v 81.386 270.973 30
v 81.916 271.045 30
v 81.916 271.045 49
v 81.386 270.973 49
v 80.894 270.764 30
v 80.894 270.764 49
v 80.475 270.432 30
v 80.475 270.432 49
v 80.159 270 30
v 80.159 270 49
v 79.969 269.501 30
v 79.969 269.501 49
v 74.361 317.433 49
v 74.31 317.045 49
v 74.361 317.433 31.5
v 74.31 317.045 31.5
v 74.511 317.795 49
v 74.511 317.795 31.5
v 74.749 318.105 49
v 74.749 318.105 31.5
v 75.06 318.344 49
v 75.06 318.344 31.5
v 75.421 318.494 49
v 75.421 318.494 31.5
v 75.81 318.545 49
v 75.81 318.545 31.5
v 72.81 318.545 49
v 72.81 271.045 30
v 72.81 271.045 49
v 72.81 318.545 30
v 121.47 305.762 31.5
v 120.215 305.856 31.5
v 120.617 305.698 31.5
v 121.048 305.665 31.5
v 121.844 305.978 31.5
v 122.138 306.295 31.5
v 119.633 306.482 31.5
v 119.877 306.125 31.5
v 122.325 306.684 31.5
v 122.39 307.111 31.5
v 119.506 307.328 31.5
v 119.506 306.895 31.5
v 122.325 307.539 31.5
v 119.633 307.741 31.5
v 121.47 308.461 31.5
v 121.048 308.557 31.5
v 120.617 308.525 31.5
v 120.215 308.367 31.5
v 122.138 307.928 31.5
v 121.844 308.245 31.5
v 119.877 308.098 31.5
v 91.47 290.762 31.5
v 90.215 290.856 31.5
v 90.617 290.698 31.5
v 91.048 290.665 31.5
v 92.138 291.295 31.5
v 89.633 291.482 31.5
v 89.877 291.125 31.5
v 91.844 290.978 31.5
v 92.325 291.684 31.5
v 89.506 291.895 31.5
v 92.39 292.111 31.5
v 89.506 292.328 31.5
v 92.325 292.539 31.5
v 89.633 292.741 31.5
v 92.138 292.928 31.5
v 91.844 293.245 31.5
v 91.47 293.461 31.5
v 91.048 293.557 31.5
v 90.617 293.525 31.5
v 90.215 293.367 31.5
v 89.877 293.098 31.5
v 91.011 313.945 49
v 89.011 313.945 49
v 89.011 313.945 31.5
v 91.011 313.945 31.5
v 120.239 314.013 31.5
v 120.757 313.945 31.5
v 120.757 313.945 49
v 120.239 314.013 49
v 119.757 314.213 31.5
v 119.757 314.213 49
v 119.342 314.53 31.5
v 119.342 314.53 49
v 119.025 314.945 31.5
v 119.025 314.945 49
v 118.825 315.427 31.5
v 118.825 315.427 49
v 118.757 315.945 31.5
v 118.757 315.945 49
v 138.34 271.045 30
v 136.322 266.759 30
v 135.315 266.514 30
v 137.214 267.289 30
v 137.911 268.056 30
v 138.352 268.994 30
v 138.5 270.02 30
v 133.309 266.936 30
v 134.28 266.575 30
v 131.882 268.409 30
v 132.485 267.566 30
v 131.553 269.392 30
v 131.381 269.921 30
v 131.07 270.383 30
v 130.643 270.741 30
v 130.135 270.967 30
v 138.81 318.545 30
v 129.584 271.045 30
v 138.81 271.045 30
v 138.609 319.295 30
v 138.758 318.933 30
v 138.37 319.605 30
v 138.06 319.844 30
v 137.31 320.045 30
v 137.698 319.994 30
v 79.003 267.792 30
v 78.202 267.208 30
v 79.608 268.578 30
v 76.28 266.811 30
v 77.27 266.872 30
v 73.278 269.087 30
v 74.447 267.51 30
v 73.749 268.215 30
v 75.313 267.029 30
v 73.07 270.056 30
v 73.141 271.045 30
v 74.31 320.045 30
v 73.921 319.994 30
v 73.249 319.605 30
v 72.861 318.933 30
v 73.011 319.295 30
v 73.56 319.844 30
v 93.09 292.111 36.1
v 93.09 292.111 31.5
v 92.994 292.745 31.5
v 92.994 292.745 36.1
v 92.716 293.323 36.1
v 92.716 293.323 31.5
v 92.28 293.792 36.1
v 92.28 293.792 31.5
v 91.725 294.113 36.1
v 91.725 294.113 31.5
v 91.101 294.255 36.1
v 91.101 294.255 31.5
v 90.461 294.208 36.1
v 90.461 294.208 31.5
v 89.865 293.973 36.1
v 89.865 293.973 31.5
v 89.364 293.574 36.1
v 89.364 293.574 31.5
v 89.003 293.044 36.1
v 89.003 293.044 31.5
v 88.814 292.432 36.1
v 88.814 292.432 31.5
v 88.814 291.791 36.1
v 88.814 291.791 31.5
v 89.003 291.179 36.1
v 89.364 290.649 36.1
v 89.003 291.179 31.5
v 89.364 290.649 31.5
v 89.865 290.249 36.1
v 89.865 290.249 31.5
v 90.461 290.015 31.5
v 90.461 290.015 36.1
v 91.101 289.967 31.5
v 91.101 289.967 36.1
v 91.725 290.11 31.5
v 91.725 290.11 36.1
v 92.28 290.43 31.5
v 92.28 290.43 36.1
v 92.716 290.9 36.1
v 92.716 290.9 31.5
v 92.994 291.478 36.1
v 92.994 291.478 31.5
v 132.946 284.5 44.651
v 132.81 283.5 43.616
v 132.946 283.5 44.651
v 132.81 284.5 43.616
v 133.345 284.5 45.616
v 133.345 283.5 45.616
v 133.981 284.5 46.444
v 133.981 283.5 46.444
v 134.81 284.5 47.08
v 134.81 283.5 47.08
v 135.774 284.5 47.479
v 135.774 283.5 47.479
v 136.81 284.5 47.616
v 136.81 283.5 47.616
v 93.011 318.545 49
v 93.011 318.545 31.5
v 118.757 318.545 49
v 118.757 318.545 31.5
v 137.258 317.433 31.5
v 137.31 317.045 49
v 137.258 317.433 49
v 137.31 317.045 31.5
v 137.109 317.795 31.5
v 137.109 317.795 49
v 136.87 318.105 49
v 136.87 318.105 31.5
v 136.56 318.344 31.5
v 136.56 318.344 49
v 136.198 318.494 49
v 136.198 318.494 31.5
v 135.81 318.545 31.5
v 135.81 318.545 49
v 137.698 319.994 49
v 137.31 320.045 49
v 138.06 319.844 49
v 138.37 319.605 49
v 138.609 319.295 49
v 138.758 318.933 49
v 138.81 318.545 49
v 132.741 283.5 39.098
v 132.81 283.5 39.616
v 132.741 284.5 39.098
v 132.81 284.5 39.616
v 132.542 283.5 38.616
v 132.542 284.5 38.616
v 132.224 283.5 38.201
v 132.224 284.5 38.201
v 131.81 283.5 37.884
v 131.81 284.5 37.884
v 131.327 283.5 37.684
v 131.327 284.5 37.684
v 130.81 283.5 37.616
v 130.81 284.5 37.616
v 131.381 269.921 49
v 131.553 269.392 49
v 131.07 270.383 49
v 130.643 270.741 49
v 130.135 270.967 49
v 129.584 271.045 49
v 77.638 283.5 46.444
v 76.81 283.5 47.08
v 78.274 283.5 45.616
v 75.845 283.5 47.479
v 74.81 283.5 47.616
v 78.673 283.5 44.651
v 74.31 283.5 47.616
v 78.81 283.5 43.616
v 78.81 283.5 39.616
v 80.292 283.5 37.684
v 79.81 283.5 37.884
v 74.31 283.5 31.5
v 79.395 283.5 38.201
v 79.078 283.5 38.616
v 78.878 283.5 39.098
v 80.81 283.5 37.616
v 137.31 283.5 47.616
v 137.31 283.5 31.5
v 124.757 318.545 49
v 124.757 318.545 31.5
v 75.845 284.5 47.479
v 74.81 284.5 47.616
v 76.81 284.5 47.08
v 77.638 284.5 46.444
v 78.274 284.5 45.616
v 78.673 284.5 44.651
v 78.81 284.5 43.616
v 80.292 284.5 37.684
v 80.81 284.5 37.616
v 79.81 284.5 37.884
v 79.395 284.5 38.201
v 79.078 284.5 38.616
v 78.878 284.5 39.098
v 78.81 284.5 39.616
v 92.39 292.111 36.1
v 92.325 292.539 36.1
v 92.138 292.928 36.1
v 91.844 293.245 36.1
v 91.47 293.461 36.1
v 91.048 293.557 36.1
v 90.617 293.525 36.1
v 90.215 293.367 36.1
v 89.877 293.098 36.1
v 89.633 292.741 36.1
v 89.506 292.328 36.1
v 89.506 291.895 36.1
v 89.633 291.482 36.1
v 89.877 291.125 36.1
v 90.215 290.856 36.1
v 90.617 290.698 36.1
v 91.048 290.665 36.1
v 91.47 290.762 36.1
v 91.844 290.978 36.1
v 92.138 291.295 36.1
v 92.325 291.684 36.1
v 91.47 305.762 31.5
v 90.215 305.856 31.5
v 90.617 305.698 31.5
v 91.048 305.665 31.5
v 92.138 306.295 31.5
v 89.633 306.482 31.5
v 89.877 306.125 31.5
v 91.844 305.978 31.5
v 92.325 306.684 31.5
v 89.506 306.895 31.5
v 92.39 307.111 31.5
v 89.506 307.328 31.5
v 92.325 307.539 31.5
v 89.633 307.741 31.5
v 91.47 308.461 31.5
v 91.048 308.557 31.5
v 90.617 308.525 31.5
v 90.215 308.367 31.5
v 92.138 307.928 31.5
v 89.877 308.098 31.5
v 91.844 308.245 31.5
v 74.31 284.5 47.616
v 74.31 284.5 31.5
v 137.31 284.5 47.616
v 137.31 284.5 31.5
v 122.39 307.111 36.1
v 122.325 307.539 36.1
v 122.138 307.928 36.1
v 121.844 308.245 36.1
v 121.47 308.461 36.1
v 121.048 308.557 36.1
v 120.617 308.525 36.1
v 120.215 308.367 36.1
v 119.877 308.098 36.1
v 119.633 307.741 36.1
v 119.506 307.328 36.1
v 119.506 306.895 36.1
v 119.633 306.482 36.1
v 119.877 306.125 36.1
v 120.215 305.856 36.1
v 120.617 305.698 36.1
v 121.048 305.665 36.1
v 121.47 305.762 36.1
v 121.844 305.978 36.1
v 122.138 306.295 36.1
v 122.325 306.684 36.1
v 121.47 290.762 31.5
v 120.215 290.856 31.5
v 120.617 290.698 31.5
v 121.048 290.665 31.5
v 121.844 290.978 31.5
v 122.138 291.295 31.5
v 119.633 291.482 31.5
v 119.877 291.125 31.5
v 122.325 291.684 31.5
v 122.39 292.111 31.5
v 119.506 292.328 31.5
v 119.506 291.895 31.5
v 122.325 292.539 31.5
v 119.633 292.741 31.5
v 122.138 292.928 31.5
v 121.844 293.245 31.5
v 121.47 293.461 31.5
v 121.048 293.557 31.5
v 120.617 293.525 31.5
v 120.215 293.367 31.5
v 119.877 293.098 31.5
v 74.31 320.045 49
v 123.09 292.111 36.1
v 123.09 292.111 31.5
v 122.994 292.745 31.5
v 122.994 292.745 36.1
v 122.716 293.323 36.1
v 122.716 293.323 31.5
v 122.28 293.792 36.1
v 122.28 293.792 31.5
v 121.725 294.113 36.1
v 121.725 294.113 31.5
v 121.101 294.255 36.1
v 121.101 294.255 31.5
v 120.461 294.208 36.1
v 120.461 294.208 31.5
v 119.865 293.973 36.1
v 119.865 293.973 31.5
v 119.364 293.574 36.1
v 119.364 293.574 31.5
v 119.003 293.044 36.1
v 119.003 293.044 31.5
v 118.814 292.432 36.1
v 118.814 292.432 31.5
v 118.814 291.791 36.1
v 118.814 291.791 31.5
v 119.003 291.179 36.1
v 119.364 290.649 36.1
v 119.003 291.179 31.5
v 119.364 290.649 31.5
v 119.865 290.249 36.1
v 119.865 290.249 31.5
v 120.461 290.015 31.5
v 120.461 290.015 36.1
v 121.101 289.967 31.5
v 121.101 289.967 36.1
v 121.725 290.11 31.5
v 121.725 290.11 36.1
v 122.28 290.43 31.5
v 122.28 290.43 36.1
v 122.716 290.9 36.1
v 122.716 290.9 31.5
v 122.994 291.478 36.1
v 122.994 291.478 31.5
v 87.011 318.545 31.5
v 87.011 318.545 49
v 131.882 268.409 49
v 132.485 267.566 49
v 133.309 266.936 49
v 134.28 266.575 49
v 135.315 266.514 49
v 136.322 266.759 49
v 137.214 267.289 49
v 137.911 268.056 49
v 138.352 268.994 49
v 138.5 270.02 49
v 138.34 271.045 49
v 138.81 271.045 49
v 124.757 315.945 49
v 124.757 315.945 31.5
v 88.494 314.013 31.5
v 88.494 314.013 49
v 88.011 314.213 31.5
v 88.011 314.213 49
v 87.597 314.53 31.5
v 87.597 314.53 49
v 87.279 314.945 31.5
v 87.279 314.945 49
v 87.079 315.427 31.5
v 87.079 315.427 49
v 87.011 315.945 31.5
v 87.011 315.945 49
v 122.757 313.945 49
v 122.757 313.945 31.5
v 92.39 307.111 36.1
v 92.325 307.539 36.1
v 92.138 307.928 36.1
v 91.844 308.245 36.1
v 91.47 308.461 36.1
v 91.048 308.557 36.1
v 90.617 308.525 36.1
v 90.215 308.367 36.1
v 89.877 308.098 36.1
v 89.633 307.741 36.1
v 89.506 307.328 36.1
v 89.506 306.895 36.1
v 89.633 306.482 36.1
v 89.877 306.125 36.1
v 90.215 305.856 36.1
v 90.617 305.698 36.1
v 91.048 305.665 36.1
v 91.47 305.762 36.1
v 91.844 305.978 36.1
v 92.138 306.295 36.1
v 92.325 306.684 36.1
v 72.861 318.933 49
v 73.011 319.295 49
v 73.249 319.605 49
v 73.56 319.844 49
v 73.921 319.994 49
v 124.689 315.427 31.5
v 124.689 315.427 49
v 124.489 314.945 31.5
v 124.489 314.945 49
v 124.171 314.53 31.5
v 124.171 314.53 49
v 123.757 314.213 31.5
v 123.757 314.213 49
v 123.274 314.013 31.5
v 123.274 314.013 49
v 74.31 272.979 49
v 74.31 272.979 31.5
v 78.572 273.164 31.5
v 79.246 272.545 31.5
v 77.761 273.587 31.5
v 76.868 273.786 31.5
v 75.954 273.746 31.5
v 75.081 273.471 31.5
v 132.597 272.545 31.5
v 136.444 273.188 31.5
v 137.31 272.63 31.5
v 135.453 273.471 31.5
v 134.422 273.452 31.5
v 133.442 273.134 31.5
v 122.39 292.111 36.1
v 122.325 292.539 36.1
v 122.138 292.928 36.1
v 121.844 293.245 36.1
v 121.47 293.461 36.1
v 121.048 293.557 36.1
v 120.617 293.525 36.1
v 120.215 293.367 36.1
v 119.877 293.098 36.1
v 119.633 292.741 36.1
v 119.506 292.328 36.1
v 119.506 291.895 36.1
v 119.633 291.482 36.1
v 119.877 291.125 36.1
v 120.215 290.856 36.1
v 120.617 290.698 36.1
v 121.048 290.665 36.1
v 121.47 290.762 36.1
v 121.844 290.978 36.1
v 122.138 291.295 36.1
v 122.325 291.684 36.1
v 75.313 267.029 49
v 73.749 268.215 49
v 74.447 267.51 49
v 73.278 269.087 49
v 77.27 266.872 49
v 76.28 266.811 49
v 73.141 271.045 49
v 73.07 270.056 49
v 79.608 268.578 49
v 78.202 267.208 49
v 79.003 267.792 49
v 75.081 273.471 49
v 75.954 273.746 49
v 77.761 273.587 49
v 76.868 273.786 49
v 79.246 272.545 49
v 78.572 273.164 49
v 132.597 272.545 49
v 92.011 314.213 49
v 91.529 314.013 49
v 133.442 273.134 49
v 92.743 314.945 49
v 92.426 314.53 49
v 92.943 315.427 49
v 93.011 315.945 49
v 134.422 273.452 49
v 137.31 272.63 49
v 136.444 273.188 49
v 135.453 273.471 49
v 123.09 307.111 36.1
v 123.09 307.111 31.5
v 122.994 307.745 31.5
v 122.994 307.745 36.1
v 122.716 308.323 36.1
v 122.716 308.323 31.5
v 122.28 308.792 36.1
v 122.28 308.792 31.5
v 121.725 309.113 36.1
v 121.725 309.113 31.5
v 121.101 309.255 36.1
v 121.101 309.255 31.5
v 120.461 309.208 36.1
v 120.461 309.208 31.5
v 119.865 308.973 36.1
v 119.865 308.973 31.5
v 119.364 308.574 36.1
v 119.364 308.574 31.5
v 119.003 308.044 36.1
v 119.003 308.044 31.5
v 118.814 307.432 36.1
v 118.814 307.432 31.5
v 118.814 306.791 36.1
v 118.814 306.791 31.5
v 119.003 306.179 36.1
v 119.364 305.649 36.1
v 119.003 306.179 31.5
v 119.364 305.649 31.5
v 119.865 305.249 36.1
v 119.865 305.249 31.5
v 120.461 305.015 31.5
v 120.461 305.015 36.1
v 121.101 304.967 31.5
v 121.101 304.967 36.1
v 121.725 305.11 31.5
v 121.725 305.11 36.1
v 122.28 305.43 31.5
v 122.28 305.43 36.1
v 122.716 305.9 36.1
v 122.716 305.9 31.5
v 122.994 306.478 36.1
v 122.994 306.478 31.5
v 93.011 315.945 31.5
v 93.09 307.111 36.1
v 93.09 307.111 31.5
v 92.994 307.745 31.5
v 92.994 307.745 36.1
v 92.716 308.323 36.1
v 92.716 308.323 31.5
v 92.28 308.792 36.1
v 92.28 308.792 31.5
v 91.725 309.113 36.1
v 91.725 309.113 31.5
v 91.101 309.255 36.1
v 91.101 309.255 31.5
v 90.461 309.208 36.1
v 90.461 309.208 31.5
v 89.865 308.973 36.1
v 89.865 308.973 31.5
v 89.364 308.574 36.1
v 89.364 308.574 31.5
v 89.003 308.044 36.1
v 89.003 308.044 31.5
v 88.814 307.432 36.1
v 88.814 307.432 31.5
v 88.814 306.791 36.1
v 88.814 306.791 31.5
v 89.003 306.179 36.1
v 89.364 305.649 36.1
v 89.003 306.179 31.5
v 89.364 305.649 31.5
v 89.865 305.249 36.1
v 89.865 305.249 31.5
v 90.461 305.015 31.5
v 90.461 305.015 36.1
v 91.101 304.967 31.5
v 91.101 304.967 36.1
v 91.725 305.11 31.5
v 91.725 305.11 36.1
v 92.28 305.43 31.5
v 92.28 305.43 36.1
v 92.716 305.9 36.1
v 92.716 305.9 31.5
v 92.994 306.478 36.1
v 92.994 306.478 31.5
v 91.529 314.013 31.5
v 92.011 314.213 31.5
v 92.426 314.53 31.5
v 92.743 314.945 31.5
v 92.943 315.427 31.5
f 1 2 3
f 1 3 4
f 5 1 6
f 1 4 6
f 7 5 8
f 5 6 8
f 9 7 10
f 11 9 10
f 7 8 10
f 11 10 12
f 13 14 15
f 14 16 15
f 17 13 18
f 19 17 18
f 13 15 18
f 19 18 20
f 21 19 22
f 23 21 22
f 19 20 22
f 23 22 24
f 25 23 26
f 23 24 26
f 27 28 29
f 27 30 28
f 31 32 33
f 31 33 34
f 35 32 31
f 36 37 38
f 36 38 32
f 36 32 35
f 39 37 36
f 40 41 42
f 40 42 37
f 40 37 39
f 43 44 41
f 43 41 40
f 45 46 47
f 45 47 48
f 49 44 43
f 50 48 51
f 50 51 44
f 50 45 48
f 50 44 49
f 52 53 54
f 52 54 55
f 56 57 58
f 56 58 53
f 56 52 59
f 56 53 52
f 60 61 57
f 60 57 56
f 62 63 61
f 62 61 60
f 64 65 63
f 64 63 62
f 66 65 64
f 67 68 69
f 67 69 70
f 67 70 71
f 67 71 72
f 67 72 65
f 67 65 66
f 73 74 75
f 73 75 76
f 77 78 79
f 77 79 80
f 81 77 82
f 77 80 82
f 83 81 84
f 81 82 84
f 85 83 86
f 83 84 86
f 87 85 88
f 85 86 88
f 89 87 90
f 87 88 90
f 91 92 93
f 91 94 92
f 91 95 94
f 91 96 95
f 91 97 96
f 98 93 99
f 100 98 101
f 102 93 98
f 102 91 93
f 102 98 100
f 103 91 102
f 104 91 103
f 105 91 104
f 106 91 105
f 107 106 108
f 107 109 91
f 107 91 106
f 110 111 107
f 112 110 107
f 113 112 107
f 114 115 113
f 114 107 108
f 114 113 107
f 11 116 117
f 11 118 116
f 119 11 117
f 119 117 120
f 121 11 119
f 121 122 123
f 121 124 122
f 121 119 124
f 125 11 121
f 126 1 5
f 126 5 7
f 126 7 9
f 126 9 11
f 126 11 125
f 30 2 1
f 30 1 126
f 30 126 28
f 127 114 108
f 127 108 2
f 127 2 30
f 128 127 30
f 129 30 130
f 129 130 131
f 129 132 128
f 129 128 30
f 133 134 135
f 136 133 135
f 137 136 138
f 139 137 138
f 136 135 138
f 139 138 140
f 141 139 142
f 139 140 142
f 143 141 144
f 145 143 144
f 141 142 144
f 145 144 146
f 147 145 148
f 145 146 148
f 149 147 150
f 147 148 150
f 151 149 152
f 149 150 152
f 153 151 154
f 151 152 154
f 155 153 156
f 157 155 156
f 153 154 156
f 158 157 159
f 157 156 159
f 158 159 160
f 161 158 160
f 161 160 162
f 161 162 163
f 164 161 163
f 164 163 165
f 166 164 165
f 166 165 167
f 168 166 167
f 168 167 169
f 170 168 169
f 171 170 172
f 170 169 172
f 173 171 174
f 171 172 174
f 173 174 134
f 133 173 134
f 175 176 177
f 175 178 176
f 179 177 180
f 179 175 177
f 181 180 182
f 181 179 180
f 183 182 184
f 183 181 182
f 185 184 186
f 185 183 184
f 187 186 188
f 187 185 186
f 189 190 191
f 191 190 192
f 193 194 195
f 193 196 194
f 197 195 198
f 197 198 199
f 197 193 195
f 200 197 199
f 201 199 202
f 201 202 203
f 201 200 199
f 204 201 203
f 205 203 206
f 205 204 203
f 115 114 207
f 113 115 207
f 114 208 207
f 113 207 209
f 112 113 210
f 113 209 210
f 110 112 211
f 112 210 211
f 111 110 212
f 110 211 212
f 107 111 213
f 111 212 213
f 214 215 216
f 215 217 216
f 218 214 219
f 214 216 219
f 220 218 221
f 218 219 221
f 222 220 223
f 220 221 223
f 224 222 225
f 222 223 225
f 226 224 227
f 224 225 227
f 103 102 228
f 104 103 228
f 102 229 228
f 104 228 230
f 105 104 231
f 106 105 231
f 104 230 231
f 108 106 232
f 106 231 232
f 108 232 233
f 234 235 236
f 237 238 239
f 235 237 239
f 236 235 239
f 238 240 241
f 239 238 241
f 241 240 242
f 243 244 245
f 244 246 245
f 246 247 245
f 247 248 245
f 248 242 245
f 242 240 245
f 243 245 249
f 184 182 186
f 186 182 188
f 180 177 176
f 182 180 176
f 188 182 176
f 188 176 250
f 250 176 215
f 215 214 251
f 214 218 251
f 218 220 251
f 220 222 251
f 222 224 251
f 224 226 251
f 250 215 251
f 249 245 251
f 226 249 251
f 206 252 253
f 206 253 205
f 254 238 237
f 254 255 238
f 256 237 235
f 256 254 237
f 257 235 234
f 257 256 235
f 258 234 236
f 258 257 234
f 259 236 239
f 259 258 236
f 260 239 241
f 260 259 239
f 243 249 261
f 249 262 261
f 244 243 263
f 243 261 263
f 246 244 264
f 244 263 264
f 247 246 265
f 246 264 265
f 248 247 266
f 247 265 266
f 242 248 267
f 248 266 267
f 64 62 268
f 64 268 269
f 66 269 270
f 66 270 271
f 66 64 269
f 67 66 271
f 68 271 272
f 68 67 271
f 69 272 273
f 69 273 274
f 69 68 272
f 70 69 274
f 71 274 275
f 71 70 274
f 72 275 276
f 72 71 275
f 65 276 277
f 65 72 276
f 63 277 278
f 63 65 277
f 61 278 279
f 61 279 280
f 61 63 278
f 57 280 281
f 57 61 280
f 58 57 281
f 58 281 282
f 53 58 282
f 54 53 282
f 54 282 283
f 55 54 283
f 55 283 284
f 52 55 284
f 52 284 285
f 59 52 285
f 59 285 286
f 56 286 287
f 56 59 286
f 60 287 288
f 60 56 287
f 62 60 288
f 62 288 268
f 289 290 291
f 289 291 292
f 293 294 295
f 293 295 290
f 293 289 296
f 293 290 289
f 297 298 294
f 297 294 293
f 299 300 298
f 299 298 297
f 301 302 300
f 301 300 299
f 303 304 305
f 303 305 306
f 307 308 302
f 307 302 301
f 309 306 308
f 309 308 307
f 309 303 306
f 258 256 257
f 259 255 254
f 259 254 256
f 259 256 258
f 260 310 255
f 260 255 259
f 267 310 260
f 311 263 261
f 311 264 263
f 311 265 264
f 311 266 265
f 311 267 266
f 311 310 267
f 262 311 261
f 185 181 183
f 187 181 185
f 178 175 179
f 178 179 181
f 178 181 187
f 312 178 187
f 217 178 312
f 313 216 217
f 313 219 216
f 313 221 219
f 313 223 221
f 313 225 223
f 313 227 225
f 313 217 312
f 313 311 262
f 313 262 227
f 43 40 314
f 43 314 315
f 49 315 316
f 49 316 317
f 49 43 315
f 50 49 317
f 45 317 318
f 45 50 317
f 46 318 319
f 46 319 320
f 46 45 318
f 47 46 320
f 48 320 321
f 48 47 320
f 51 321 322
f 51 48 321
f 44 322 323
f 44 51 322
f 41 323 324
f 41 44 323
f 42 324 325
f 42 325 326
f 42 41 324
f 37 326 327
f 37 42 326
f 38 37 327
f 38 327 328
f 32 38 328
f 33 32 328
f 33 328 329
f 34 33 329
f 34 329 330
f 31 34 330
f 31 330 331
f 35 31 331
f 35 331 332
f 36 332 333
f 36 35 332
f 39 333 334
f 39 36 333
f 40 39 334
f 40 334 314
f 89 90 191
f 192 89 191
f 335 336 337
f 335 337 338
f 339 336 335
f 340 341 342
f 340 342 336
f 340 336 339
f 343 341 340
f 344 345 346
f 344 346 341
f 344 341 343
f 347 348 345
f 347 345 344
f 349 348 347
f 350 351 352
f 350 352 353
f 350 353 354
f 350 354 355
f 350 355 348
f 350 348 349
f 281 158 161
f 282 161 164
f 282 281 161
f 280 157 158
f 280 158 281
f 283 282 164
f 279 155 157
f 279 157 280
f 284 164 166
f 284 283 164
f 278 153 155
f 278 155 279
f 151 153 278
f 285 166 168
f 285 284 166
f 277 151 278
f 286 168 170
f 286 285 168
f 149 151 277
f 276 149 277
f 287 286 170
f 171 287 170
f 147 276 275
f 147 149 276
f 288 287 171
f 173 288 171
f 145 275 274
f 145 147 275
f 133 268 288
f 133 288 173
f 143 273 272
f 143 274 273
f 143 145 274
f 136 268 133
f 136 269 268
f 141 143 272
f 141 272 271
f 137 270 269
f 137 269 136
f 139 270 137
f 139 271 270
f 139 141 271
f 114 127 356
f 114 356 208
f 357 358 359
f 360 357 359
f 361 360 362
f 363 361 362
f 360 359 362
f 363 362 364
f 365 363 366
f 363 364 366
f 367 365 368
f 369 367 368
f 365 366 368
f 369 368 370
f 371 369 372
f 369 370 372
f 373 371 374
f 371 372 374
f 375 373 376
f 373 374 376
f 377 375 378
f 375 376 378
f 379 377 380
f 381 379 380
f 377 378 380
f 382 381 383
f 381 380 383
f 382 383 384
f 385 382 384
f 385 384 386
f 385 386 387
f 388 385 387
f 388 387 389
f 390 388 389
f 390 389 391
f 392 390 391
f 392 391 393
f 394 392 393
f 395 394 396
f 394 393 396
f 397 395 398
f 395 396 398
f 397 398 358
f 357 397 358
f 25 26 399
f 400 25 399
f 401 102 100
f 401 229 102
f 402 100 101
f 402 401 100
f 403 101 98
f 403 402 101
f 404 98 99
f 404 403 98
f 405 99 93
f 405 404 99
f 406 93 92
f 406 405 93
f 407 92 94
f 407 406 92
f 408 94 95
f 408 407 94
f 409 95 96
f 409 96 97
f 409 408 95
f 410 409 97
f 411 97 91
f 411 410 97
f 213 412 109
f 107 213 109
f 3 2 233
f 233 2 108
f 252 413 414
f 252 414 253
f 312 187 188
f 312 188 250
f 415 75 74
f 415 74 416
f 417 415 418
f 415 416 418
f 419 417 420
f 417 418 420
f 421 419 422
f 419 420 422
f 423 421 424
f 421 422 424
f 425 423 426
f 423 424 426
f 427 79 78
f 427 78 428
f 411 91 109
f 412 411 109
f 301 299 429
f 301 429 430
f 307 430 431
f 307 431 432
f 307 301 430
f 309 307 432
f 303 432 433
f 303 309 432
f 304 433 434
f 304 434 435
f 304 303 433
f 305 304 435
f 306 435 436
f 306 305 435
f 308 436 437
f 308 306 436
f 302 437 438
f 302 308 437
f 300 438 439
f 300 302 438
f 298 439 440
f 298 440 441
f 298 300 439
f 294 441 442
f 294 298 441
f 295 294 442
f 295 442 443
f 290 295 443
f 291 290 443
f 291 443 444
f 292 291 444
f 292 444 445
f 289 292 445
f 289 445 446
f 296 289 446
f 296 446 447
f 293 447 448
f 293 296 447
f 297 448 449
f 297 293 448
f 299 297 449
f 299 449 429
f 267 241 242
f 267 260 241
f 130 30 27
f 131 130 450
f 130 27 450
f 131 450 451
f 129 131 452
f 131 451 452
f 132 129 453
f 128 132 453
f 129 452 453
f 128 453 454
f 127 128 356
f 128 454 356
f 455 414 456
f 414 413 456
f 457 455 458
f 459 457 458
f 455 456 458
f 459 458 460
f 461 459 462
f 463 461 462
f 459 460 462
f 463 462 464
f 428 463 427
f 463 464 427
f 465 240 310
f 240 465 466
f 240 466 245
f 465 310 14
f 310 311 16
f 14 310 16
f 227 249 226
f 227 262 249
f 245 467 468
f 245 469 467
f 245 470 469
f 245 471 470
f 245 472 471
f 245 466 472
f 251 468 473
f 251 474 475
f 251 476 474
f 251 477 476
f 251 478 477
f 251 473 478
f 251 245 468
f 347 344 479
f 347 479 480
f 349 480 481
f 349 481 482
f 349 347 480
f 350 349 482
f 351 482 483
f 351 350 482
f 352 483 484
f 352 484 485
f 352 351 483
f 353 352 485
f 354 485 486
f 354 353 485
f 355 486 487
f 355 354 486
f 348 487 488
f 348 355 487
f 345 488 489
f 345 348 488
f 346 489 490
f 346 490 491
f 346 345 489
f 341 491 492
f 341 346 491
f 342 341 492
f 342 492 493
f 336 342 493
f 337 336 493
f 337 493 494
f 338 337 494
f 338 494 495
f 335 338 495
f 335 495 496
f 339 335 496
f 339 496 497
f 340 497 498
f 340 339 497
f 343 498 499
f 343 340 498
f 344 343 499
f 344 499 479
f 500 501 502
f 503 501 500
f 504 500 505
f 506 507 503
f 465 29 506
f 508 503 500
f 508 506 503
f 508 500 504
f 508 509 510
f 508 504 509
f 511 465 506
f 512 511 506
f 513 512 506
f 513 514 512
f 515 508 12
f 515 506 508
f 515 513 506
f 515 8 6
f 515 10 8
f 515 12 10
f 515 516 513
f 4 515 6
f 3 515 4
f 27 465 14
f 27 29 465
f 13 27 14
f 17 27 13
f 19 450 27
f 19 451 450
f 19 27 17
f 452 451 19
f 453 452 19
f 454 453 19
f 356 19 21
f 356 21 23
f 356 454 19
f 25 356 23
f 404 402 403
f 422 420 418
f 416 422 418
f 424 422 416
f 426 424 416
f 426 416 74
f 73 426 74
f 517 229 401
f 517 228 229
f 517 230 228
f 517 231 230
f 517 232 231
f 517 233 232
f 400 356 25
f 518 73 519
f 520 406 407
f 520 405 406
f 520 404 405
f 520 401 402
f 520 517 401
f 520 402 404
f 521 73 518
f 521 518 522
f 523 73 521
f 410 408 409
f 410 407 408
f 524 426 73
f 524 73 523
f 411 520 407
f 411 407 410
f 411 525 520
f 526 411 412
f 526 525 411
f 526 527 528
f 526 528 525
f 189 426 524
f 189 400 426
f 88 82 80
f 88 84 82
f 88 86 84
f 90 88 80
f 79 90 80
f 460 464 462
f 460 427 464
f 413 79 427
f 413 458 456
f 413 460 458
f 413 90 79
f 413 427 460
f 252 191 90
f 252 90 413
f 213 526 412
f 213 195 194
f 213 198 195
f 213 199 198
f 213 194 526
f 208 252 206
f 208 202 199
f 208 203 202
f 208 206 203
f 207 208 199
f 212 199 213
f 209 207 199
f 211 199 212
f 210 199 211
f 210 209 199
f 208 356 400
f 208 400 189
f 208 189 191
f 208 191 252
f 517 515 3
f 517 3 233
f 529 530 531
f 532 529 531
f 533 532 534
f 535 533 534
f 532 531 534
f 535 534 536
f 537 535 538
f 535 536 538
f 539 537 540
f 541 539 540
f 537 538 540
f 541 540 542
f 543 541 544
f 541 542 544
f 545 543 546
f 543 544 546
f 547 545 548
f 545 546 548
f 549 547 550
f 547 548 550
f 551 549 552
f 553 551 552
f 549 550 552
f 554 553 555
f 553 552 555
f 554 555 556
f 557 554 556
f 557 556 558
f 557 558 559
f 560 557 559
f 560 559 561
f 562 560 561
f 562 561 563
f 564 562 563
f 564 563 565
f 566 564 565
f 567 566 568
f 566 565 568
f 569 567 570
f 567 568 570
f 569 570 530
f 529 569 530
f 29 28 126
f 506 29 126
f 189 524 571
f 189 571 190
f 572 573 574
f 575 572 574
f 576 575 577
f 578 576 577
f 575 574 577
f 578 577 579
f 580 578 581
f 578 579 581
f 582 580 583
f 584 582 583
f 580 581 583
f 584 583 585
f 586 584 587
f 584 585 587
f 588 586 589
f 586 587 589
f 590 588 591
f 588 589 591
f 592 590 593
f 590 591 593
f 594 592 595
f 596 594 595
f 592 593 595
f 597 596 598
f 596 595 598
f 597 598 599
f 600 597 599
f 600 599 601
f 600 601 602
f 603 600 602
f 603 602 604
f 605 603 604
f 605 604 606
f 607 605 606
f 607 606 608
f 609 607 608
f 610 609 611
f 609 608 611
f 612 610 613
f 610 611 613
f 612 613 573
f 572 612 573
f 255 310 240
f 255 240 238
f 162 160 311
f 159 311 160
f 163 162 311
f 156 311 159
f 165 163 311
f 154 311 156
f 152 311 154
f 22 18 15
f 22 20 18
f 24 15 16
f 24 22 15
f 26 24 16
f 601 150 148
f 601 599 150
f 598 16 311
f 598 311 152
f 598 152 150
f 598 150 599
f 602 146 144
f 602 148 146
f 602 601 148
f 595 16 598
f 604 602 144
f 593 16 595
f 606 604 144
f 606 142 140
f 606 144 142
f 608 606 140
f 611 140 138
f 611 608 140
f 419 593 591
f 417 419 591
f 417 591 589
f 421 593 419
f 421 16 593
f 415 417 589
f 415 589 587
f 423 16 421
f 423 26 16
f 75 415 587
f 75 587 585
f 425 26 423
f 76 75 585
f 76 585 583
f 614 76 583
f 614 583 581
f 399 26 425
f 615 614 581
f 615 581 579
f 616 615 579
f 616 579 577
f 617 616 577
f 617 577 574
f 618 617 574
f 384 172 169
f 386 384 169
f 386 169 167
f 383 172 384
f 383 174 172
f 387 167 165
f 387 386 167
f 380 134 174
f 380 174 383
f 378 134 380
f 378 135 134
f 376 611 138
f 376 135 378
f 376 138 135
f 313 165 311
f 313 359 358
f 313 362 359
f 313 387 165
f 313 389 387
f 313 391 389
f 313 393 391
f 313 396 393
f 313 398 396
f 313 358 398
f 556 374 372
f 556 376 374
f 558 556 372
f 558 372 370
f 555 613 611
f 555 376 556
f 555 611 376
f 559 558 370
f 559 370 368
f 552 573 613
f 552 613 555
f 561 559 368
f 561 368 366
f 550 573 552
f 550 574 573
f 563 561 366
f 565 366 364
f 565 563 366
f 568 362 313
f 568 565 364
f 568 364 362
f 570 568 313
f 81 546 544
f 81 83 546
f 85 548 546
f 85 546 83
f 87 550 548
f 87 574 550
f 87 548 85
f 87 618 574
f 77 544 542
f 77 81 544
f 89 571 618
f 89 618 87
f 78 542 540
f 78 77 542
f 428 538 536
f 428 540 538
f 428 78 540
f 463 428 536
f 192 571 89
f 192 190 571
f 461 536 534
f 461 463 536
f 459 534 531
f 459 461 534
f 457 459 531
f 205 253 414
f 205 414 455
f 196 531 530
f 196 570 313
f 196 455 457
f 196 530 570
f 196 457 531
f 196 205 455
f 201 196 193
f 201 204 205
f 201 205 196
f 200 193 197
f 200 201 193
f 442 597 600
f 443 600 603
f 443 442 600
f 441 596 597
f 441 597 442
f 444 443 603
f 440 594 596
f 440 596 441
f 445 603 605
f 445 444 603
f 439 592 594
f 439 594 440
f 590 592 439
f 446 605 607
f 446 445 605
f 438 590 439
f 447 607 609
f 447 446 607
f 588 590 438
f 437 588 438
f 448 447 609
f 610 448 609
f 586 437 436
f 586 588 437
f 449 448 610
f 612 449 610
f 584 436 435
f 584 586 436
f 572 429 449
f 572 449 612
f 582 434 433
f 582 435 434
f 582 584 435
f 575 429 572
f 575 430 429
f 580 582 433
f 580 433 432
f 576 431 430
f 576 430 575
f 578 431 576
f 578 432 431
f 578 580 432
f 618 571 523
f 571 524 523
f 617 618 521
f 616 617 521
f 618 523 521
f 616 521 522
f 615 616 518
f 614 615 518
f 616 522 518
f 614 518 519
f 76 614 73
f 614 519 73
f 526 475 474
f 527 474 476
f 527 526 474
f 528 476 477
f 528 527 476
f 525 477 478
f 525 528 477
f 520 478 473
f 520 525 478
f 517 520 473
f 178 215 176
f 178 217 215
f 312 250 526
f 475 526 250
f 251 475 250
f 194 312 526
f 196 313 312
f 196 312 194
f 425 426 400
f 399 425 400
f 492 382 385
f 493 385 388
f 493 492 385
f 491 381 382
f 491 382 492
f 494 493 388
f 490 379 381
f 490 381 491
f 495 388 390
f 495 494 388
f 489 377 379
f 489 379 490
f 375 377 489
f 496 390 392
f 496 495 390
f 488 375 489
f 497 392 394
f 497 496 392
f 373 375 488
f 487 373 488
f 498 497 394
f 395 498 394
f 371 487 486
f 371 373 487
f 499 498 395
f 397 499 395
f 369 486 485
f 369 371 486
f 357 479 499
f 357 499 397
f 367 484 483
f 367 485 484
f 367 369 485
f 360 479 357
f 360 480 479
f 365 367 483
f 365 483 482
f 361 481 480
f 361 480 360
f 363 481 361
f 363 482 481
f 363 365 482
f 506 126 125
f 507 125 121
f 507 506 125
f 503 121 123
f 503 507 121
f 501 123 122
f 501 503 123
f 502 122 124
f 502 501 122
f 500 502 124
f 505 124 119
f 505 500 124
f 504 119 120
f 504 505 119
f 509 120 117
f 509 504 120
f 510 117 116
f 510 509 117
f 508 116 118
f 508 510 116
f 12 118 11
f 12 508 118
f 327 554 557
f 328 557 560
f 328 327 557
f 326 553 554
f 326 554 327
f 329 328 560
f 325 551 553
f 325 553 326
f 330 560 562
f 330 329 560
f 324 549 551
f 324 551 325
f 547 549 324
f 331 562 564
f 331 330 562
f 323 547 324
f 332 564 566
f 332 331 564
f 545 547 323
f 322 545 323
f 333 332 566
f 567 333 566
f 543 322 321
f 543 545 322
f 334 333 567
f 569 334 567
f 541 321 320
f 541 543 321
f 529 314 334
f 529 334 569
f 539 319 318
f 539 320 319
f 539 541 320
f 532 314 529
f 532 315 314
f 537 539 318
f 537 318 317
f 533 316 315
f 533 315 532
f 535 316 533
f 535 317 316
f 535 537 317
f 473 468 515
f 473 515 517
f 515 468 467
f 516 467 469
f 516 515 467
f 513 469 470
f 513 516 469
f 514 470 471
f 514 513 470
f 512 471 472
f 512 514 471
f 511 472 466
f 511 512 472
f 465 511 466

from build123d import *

# Parameters (mm, degrees)
SKETCH1_W           = 66
SKETCH1_H           = 49
BOSS_EXTRUDE1_DEPTH = 19
SHELL1_T            = -1.5
SKETCH2_W           = 6
SKETCH2_H           = 4.6
BOSS_EXTRUDE2_DEPTH = 17.5
FILLET1_R           = 1.5
SKETCH3_R           = 2.15
SKETCH3_R_2         = 1.45
BOSS_EXTRUDE3_DEPTH = 4.6
BOSS_EXTRUDE4_DEPTH = 0.5
FILLET2_R           = 4
FILLET3_R           = 2
BOSS_EXTRUDE5_REACH = 351.368
SKETCH5_R           = 3.5
FILLET4_R           = 2


with BuildPart() as part:
    # Sketch1 → Boss-Extrude1 (new body)
    with BuildSketch(Plane.XY.offset(30)):
        with Locations((105.809562907, 295.544660887)):
            Rectangle(SKETCH1_W, SKETCH1_H)
    extrude(amount=BOSS_EXTRUDE1_DEPTH)

    # Shell1
    shell1_openings = [part.faces().sort_by_distance(p)[0] for p in [
        (105.809562907, 295.544660887, 49),
    ]]
    offset(amount=SHELL1_T, openings=shell1_openings, kind=Kind.INTERSECTION)

    # Sketch2 → Boss-Extrude2 (add)
    with BuildSketch(Plane.XY.offset(31.5)):
        with Locations((90.011318394, 316.244660887)):
            Rectangle(SKETCH2_W, SKETCH2_H)
        with Locations((121.756668801, 316.244660887)):
            Rectangle(SKETCH2_W, SKETCH2_H)
    extrude(amount=BOSS_EXTRUDE2_DEPTH)

    # Fillet1
    fillet1_edges = [part.edges().sort_by_distance(p)[0] for p in [
        (74.309562907, 318.544660887, 40.25),
        (137.309562907, 318.544660887, 40.25),
        (72.809562907, 320.044660887, 39.5),
        (138.809562907, 320.044660887, 39.5),
    ]]
    fillet(fillet1_edges, radius=FILLET1_R)

    # Sketch3 → Boss-Extrude3 (add)
    # profile 1 of 4: a face of its own
    with BuildSketch(Plane.XY.offset(31.5)):
        with Locations((90.939840403, 307.111410879)):
            Circle(SKETCH3_R)
        with Locations((90.939840403, 307.111410879)):
            Circle(SKETCH3_R_2, mode=Mode.SUBTRACT)
    # profile 2 of 4: a face of its own
    with BuildSketch(Plane.XY.offset(31.5)):
        with Locations((120.939840403, 307.111410879)):
            Circle(SKETCH3_R)
        with Locations((120.939840403, 307.111410879)):
            Circle(SKETCH3_R_2, mode=Mode.SUBTRACT)
    # profile 3 of 4: a face of its own
    with BuildSketch(Plane.XY.offset(31.5)):
        with Locations((120.939840403, 292.111410879)):
            Circle(SKETCH3_R)
        with Locations((120.939840403, 292.111410879)):
            Circle(SKETCH3_R_2, mode=Mode.SUBTRACT)
    # profile 4 of 4: a face of its own
    with BuildSketch(Plane.XY.offset(31.5)):
        with Locations((90.939840403, 292.111410879)):
            Circle(SKETCH3_R)
        with Locations((90.939840403, 292.111410879)):
            Circle(SKETCH3_R_2, mode=Mode.SUBTRACT)
    extrude(amount=BOSS_EXTRUDE3_DEPTH)

    # Sketch4 → Boss-Extrude4 (add, symmetric)
    with BuildSketch(Plane(origin=(0, 284, 0), x_dir=(1, 0, 0), z_dir=(0, 1, 0))):
        Polygon((72.809562907, -47.615589413), (78.809562907, -47.615589413), (78.809562907, -37.615589413), (132.809562907, -37.615589413), (132.809562907, -47.615589413), (138.809562907, -47.615589413), (138.809562907, -30), (72.809562907, -30), align=None)
    extrude(amount=BOSS_EXTRUDE4_DEPTH, both=True)

    # Fillet2
    fillet2_edges = [part.edges().sort_by_distance(p)[0] for p in [
        (78.809562907, 284, 47.615589413),
        (132.809562907, 284, 47.615589413),
    ]]
    fillet(fillet2_edges, radius=FILLET2_R)

    # Fillet3
    fillet3_edges = [part.edges().sort_by_distance(p)[0] for p in [
        (78.809562907, 284, 37.615589413),
        (132.809562907, 284, 37.615589413),
    ]]
    fillet(fillet3_edges, radius=FILLET3_R)

    # Boss-Extrude5: up to this face of the body (flat: up to its plane)
    boss_extrude5_end = Plane(part.part.faces().sort_by_distance((105.809562907, 295.537442811, 30))[0])
    # Sketch5 → Boss-Extrude5 (add, up to the picked face)
    with BuildSketch(Plane.XY.offset(49), mode=Mode.PRIVATE) as boss_extrude5_sk1:
        with Locations((76.56102911, 270.299359986)):
            Circle(SKETCH5_R)
    boss_extrude5_tool1 = split(extrude(boss_extrude5_sk1.sketch, amount=-BOSS_EXTRUDE5_REACH, mode=Mode.PRIVATE), bisect_by=boss_extrude5_end, keep=Keep.BOTH, mode=Mode.PRIVATE)
    # Sketch5 → Boss-Extrude5 (add, up to the picked face)
    with BuildSketch(Plane.XY.offset(49), mode=Mode.PRIVATE) as boss_extrude5_sk2:
        with Locations((135, 270)):
            Circle(SKETCH5_R)
    boss_extrude5_tool2 = split(extrude(boss_extrude5_sk2.sketch, amount=-BOSS_EXTRUDE5_REACH, mode=Mode.PRIVATE), bisect_by=boss_extrude5_end, keep=Keep.BOTH, mode=Mode.PRIVATE)
    add(boss_extrude5_tool1.solids().sort_by(Axis((76.561029, 270.29936, 49), (0, 0, -1)))[0])
    add(boss_extrude5_tool2.solids().sort_by(Axis((135, 270, 49), (0, 0, -1)))[0])

    # Fillet4
    fillet4_edges = [part.edges().sort_by_distance(p)[0] for p in [
        (79.980755206, 271.044660887, 39.5),
        (131.659538411, 271.044660887, 39.5),
        (87.011318394, 313.944660887, 40.25),
        (93.011318394, 313.944660887, 40.25),
        (118.756668801, 313.944660887, 40.25),
        (124.756668801, 313.944660887, 40.25),
    ]]
    fillet(fillet4_edges, radius=FILLET4_R)


solid = part.part
